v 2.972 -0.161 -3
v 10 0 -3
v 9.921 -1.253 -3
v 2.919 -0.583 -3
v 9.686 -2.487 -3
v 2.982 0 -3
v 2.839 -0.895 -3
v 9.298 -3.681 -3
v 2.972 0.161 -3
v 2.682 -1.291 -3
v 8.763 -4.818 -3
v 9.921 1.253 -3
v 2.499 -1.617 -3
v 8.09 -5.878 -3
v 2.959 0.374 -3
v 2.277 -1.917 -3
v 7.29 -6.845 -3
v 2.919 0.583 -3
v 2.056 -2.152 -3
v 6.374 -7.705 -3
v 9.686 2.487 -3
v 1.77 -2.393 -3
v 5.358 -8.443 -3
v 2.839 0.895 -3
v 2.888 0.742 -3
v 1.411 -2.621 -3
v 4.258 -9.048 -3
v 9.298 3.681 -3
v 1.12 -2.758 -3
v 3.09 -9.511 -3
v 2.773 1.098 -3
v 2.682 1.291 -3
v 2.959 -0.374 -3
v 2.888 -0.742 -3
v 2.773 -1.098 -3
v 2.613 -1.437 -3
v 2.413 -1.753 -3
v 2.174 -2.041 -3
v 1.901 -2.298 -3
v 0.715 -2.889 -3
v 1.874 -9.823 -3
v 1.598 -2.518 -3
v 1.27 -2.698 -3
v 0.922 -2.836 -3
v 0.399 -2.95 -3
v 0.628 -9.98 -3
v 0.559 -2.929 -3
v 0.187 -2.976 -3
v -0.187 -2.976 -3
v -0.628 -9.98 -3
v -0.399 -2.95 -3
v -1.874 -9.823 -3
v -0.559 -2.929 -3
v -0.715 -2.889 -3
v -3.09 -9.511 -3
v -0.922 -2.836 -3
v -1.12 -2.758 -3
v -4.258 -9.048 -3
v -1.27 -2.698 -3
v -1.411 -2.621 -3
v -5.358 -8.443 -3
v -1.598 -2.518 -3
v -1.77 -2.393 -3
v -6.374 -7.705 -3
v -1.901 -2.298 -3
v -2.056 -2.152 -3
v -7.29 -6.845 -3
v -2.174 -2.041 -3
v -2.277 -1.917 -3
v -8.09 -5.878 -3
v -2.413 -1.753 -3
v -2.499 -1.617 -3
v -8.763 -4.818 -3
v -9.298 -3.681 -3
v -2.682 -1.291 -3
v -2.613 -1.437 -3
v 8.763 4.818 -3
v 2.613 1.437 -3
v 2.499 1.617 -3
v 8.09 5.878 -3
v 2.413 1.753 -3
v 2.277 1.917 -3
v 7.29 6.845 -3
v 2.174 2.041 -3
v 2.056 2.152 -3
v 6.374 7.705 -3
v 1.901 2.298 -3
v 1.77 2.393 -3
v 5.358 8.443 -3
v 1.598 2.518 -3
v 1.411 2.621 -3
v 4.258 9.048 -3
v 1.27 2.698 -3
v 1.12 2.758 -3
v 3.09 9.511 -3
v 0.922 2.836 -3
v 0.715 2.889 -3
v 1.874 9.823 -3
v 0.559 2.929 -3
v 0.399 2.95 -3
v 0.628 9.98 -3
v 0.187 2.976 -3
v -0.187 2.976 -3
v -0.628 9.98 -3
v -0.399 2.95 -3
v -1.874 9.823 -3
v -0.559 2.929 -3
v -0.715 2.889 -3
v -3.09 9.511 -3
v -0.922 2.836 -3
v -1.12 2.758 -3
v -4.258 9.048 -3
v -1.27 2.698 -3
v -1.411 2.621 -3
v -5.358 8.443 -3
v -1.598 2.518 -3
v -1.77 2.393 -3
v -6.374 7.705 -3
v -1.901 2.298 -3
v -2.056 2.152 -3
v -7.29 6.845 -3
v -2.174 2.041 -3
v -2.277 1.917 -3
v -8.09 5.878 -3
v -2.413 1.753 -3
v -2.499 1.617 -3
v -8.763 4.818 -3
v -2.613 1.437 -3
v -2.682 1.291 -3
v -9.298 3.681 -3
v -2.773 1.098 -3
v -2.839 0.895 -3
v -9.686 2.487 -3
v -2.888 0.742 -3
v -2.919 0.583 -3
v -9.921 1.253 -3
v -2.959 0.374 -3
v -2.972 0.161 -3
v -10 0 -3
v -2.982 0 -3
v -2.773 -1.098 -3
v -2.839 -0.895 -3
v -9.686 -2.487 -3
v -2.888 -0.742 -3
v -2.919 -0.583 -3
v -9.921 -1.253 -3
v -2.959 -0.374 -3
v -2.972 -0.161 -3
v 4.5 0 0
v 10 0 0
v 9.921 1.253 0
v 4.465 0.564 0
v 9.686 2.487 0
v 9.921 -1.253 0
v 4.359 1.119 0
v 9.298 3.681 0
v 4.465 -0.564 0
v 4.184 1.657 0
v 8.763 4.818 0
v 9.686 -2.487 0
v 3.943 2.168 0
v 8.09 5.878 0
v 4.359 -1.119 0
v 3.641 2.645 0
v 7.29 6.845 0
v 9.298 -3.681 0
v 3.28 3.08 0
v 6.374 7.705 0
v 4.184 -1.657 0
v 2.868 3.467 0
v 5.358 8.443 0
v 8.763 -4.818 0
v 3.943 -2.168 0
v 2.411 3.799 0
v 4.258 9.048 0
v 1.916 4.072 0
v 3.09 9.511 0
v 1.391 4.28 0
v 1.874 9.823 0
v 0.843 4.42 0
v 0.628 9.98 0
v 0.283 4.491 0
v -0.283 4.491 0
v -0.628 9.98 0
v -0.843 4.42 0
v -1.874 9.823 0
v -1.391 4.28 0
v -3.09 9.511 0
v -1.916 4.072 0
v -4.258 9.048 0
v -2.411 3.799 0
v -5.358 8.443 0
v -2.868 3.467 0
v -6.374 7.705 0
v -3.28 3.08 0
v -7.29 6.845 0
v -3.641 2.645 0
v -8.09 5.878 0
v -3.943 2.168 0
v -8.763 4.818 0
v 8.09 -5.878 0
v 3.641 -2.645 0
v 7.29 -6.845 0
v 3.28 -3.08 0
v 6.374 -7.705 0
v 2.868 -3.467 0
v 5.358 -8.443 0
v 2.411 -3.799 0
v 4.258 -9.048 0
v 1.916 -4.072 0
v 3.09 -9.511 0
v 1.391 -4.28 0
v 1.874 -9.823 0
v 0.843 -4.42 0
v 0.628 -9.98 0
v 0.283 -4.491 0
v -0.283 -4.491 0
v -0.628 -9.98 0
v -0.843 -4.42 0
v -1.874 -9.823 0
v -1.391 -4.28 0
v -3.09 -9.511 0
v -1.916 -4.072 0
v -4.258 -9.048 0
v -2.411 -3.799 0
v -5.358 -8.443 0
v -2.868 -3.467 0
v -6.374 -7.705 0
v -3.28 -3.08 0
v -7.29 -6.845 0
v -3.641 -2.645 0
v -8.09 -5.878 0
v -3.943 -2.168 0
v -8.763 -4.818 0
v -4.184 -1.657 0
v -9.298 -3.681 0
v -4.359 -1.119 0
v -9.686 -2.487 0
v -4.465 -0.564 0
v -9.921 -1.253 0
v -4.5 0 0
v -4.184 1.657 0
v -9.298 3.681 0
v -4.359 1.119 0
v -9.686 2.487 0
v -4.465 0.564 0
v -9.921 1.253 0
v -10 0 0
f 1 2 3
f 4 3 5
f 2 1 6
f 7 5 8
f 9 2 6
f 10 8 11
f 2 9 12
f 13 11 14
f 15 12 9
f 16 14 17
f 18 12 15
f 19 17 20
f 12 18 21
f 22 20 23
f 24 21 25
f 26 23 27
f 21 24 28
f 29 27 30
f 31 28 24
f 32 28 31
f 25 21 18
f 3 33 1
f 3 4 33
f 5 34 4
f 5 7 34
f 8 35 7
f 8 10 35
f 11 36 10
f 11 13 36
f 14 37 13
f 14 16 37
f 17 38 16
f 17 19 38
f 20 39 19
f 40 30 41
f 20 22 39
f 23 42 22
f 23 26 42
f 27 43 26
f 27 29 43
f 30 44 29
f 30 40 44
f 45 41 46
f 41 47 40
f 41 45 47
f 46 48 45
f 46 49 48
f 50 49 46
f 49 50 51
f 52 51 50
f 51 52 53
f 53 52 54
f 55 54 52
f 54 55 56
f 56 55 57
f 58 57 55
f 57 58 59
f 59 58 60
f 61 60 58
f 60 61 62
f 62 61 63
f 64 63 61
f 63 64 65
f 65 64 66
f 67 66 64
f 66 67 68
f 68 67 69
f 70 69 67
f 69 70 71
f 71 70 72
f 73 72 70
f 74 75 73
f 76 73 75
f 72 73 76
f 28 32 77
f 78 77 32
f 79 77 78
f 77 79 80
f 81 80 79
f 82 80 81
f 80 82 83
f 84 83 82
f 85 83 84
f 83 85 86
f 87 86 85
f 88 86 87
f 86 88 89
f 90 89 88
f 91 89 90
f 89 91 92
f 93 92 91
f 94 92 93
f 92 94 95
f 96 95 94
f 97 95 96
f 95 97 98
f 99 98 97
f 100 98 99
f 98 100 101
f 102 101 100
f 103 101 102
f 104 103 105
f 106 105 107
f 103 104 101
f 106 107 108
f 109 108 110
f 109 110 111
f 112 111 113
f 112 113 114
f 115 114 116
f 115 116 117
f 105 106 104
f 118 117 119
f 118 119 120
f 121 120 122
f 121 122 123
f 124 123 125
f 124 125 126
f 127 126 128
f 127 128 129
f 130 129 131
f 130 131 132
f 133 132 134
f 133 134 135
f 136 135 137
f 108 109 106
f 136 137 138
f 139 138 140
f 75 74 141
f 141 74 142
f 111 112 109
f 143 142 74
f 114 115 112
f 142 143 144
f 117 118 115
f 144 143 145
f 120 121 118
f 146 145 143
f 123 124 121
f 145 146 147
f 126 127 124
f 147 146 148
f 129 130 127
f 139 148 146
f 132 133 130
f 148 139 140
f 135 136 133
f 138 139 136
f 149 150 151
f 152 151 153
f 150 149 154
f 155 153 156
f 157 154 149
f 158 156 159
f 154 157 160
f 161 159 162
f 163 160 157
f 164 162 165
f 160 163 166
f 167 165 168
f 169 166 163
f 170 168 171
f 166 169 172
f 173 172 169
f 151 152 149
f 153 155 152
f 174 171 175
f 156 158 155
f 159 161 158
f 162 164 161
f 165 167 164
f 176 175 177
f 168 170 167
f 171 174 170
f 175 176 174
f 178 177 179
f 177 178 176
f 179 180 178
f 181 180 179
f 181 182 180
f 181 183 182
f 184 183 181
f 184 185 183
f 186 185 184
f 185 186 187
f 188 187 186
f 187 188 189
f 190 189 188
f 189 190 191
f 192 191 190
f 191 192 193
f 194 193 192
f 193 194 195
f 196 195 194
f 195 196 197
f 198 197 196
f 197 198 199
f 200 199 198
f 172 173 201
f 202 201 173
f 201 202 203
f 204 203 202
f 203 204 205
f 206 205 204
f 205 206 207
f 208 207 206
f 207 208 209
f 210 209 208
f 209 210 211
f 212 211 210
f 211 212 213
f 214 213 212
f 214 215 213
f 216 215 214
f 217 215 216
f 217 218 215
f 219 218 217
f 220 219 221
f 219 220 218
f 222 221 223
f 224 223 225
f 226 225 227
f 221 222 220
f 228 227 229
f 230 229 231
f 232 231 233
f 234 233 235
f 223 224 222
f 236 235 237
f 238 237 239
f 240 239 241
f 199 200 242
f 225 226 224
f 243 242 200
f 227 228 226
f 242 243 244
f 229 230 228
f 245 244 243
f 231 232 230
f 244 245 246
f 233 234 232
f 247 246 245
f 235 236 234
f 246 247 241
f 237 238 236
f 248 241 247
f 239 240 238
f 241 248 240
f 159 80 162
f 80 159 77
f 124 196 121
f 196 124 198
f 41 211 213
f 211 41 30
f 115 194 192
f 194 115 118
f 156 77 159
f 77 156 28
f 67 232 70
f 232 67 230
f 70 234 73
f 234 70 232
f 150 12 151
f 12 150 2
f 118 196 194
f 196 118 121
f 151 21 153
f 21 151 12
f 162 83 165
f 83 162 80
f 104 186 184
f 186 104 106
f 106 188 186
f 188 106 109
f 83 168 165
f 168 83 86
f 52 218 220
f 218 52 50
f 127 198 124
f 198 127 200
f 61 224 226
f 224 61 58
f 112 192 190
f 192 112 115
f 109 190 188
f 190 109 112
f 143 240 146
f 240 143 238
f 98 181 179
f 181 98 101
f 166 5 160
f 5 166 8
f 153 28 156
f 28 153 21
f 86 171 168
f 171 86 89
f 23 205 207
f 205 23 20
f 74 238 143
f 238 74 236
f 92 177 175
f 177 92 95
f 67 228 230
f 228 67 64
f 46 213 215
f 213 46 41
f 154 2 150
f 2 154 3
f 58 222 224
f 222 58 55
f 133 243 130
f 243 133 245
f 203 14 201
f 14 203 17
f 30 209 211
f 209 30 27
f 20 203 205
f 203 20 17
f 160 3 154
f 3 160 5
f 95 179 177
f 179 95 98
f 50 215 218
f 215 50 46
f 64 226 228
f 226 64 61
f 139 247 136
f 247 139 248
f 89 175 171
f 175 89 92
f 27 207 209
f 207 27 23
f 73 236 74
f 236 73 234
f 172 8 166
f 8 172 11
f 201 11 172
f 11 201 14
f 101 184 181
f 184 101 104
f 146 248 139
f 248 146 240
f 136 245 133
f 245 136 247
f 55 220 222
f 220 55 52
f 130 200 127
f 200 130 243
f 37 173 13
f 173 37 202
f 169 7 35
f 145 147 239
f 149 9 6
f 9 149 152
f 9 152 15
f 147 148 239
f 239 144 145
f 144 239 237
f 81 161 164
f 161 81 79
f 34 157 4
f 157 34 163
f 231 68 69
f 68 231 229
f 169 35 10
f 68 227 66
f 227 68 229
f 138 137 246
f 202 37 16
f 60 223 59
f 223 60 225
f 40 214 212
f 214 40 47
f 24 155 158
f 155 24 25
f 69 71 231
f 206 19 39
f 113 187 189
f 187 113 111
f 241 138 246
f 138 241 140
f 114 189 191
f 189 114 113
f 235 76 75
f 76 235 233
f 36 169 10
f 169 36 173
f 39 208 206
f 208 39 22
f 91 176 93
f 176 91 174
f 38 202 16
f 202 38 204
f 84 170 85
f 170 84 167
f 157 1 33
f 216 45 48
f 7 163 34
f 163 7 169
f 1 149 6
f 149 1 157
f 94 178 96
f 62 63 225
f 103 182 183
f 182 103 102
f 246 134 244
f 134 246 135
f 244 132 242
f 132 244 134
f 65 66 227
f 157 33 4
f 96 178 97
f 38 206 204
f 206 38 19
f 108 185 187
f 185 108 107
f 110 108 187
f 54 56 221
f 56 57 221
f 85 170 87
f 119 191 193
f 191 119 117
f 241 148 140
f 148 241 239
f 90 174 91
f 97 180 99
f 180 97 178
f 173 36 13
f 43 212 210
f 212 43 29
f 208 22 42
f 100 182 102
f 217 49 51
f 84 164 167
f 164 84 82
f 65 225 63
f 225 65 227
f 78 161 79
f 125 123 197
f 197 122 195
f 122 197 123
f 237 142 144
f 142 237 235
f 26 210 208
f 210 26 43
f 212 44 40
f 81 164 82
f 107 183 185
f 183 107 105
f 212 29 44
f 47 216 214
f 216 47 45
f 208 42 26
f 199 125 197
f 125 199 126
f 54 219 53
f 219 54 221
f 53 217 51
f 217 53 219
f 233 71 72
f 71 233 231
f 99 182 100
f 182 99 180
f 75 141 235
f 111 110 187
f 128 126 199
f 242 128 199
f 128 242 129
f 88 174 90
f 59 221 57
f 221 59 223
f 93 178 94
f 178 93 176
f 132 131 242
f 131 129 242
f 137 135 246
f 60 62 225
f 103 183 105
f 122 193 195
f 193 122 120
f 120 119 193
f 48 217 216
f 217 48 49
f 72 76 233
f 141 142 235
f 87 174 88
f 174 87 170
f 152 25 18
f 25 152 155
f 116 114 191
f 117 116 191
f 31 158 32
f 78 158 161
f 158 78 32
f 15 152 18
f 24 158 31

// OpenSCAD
$fn = 50;


difference() {
	union() {
		translate(v = [0, 0, -3.0000000000]) {
			cylinder(h = 3, r = 7.0000000000);
		}
		translate(v = [0, 0, -3.0000000000]) {
			cylinder(h = 3, r = 10.0000000000);
		}
	}
	union() {
		translate(v = [0, 0, 0]) {
			rotate(a = [0, 0, 0]) {
				difference() {
					union() {
						#translate(v = [0, 0, -3.0000000000]) {
							cylinder(h = 3, r = 2.2500000000);
						}
						#translate(v = [0, 0, -4.2000000000]) {
							cylinder(h = 4.2000000000, r = 7.0000000000, r1 = 2.3750000000, r2 = 4.5000000000);
						}
						#translate(v = [0, 0, -3.0000000000]) {
							cylinder(h = 3, r = 2.3750000000);
						}
						#translate(v = [0, 0, -3.0000000000]) {
							cylinder(h = 3, r = 2.2500000000);
						}
					}
					union();
				}
			}
		}
	}
}
